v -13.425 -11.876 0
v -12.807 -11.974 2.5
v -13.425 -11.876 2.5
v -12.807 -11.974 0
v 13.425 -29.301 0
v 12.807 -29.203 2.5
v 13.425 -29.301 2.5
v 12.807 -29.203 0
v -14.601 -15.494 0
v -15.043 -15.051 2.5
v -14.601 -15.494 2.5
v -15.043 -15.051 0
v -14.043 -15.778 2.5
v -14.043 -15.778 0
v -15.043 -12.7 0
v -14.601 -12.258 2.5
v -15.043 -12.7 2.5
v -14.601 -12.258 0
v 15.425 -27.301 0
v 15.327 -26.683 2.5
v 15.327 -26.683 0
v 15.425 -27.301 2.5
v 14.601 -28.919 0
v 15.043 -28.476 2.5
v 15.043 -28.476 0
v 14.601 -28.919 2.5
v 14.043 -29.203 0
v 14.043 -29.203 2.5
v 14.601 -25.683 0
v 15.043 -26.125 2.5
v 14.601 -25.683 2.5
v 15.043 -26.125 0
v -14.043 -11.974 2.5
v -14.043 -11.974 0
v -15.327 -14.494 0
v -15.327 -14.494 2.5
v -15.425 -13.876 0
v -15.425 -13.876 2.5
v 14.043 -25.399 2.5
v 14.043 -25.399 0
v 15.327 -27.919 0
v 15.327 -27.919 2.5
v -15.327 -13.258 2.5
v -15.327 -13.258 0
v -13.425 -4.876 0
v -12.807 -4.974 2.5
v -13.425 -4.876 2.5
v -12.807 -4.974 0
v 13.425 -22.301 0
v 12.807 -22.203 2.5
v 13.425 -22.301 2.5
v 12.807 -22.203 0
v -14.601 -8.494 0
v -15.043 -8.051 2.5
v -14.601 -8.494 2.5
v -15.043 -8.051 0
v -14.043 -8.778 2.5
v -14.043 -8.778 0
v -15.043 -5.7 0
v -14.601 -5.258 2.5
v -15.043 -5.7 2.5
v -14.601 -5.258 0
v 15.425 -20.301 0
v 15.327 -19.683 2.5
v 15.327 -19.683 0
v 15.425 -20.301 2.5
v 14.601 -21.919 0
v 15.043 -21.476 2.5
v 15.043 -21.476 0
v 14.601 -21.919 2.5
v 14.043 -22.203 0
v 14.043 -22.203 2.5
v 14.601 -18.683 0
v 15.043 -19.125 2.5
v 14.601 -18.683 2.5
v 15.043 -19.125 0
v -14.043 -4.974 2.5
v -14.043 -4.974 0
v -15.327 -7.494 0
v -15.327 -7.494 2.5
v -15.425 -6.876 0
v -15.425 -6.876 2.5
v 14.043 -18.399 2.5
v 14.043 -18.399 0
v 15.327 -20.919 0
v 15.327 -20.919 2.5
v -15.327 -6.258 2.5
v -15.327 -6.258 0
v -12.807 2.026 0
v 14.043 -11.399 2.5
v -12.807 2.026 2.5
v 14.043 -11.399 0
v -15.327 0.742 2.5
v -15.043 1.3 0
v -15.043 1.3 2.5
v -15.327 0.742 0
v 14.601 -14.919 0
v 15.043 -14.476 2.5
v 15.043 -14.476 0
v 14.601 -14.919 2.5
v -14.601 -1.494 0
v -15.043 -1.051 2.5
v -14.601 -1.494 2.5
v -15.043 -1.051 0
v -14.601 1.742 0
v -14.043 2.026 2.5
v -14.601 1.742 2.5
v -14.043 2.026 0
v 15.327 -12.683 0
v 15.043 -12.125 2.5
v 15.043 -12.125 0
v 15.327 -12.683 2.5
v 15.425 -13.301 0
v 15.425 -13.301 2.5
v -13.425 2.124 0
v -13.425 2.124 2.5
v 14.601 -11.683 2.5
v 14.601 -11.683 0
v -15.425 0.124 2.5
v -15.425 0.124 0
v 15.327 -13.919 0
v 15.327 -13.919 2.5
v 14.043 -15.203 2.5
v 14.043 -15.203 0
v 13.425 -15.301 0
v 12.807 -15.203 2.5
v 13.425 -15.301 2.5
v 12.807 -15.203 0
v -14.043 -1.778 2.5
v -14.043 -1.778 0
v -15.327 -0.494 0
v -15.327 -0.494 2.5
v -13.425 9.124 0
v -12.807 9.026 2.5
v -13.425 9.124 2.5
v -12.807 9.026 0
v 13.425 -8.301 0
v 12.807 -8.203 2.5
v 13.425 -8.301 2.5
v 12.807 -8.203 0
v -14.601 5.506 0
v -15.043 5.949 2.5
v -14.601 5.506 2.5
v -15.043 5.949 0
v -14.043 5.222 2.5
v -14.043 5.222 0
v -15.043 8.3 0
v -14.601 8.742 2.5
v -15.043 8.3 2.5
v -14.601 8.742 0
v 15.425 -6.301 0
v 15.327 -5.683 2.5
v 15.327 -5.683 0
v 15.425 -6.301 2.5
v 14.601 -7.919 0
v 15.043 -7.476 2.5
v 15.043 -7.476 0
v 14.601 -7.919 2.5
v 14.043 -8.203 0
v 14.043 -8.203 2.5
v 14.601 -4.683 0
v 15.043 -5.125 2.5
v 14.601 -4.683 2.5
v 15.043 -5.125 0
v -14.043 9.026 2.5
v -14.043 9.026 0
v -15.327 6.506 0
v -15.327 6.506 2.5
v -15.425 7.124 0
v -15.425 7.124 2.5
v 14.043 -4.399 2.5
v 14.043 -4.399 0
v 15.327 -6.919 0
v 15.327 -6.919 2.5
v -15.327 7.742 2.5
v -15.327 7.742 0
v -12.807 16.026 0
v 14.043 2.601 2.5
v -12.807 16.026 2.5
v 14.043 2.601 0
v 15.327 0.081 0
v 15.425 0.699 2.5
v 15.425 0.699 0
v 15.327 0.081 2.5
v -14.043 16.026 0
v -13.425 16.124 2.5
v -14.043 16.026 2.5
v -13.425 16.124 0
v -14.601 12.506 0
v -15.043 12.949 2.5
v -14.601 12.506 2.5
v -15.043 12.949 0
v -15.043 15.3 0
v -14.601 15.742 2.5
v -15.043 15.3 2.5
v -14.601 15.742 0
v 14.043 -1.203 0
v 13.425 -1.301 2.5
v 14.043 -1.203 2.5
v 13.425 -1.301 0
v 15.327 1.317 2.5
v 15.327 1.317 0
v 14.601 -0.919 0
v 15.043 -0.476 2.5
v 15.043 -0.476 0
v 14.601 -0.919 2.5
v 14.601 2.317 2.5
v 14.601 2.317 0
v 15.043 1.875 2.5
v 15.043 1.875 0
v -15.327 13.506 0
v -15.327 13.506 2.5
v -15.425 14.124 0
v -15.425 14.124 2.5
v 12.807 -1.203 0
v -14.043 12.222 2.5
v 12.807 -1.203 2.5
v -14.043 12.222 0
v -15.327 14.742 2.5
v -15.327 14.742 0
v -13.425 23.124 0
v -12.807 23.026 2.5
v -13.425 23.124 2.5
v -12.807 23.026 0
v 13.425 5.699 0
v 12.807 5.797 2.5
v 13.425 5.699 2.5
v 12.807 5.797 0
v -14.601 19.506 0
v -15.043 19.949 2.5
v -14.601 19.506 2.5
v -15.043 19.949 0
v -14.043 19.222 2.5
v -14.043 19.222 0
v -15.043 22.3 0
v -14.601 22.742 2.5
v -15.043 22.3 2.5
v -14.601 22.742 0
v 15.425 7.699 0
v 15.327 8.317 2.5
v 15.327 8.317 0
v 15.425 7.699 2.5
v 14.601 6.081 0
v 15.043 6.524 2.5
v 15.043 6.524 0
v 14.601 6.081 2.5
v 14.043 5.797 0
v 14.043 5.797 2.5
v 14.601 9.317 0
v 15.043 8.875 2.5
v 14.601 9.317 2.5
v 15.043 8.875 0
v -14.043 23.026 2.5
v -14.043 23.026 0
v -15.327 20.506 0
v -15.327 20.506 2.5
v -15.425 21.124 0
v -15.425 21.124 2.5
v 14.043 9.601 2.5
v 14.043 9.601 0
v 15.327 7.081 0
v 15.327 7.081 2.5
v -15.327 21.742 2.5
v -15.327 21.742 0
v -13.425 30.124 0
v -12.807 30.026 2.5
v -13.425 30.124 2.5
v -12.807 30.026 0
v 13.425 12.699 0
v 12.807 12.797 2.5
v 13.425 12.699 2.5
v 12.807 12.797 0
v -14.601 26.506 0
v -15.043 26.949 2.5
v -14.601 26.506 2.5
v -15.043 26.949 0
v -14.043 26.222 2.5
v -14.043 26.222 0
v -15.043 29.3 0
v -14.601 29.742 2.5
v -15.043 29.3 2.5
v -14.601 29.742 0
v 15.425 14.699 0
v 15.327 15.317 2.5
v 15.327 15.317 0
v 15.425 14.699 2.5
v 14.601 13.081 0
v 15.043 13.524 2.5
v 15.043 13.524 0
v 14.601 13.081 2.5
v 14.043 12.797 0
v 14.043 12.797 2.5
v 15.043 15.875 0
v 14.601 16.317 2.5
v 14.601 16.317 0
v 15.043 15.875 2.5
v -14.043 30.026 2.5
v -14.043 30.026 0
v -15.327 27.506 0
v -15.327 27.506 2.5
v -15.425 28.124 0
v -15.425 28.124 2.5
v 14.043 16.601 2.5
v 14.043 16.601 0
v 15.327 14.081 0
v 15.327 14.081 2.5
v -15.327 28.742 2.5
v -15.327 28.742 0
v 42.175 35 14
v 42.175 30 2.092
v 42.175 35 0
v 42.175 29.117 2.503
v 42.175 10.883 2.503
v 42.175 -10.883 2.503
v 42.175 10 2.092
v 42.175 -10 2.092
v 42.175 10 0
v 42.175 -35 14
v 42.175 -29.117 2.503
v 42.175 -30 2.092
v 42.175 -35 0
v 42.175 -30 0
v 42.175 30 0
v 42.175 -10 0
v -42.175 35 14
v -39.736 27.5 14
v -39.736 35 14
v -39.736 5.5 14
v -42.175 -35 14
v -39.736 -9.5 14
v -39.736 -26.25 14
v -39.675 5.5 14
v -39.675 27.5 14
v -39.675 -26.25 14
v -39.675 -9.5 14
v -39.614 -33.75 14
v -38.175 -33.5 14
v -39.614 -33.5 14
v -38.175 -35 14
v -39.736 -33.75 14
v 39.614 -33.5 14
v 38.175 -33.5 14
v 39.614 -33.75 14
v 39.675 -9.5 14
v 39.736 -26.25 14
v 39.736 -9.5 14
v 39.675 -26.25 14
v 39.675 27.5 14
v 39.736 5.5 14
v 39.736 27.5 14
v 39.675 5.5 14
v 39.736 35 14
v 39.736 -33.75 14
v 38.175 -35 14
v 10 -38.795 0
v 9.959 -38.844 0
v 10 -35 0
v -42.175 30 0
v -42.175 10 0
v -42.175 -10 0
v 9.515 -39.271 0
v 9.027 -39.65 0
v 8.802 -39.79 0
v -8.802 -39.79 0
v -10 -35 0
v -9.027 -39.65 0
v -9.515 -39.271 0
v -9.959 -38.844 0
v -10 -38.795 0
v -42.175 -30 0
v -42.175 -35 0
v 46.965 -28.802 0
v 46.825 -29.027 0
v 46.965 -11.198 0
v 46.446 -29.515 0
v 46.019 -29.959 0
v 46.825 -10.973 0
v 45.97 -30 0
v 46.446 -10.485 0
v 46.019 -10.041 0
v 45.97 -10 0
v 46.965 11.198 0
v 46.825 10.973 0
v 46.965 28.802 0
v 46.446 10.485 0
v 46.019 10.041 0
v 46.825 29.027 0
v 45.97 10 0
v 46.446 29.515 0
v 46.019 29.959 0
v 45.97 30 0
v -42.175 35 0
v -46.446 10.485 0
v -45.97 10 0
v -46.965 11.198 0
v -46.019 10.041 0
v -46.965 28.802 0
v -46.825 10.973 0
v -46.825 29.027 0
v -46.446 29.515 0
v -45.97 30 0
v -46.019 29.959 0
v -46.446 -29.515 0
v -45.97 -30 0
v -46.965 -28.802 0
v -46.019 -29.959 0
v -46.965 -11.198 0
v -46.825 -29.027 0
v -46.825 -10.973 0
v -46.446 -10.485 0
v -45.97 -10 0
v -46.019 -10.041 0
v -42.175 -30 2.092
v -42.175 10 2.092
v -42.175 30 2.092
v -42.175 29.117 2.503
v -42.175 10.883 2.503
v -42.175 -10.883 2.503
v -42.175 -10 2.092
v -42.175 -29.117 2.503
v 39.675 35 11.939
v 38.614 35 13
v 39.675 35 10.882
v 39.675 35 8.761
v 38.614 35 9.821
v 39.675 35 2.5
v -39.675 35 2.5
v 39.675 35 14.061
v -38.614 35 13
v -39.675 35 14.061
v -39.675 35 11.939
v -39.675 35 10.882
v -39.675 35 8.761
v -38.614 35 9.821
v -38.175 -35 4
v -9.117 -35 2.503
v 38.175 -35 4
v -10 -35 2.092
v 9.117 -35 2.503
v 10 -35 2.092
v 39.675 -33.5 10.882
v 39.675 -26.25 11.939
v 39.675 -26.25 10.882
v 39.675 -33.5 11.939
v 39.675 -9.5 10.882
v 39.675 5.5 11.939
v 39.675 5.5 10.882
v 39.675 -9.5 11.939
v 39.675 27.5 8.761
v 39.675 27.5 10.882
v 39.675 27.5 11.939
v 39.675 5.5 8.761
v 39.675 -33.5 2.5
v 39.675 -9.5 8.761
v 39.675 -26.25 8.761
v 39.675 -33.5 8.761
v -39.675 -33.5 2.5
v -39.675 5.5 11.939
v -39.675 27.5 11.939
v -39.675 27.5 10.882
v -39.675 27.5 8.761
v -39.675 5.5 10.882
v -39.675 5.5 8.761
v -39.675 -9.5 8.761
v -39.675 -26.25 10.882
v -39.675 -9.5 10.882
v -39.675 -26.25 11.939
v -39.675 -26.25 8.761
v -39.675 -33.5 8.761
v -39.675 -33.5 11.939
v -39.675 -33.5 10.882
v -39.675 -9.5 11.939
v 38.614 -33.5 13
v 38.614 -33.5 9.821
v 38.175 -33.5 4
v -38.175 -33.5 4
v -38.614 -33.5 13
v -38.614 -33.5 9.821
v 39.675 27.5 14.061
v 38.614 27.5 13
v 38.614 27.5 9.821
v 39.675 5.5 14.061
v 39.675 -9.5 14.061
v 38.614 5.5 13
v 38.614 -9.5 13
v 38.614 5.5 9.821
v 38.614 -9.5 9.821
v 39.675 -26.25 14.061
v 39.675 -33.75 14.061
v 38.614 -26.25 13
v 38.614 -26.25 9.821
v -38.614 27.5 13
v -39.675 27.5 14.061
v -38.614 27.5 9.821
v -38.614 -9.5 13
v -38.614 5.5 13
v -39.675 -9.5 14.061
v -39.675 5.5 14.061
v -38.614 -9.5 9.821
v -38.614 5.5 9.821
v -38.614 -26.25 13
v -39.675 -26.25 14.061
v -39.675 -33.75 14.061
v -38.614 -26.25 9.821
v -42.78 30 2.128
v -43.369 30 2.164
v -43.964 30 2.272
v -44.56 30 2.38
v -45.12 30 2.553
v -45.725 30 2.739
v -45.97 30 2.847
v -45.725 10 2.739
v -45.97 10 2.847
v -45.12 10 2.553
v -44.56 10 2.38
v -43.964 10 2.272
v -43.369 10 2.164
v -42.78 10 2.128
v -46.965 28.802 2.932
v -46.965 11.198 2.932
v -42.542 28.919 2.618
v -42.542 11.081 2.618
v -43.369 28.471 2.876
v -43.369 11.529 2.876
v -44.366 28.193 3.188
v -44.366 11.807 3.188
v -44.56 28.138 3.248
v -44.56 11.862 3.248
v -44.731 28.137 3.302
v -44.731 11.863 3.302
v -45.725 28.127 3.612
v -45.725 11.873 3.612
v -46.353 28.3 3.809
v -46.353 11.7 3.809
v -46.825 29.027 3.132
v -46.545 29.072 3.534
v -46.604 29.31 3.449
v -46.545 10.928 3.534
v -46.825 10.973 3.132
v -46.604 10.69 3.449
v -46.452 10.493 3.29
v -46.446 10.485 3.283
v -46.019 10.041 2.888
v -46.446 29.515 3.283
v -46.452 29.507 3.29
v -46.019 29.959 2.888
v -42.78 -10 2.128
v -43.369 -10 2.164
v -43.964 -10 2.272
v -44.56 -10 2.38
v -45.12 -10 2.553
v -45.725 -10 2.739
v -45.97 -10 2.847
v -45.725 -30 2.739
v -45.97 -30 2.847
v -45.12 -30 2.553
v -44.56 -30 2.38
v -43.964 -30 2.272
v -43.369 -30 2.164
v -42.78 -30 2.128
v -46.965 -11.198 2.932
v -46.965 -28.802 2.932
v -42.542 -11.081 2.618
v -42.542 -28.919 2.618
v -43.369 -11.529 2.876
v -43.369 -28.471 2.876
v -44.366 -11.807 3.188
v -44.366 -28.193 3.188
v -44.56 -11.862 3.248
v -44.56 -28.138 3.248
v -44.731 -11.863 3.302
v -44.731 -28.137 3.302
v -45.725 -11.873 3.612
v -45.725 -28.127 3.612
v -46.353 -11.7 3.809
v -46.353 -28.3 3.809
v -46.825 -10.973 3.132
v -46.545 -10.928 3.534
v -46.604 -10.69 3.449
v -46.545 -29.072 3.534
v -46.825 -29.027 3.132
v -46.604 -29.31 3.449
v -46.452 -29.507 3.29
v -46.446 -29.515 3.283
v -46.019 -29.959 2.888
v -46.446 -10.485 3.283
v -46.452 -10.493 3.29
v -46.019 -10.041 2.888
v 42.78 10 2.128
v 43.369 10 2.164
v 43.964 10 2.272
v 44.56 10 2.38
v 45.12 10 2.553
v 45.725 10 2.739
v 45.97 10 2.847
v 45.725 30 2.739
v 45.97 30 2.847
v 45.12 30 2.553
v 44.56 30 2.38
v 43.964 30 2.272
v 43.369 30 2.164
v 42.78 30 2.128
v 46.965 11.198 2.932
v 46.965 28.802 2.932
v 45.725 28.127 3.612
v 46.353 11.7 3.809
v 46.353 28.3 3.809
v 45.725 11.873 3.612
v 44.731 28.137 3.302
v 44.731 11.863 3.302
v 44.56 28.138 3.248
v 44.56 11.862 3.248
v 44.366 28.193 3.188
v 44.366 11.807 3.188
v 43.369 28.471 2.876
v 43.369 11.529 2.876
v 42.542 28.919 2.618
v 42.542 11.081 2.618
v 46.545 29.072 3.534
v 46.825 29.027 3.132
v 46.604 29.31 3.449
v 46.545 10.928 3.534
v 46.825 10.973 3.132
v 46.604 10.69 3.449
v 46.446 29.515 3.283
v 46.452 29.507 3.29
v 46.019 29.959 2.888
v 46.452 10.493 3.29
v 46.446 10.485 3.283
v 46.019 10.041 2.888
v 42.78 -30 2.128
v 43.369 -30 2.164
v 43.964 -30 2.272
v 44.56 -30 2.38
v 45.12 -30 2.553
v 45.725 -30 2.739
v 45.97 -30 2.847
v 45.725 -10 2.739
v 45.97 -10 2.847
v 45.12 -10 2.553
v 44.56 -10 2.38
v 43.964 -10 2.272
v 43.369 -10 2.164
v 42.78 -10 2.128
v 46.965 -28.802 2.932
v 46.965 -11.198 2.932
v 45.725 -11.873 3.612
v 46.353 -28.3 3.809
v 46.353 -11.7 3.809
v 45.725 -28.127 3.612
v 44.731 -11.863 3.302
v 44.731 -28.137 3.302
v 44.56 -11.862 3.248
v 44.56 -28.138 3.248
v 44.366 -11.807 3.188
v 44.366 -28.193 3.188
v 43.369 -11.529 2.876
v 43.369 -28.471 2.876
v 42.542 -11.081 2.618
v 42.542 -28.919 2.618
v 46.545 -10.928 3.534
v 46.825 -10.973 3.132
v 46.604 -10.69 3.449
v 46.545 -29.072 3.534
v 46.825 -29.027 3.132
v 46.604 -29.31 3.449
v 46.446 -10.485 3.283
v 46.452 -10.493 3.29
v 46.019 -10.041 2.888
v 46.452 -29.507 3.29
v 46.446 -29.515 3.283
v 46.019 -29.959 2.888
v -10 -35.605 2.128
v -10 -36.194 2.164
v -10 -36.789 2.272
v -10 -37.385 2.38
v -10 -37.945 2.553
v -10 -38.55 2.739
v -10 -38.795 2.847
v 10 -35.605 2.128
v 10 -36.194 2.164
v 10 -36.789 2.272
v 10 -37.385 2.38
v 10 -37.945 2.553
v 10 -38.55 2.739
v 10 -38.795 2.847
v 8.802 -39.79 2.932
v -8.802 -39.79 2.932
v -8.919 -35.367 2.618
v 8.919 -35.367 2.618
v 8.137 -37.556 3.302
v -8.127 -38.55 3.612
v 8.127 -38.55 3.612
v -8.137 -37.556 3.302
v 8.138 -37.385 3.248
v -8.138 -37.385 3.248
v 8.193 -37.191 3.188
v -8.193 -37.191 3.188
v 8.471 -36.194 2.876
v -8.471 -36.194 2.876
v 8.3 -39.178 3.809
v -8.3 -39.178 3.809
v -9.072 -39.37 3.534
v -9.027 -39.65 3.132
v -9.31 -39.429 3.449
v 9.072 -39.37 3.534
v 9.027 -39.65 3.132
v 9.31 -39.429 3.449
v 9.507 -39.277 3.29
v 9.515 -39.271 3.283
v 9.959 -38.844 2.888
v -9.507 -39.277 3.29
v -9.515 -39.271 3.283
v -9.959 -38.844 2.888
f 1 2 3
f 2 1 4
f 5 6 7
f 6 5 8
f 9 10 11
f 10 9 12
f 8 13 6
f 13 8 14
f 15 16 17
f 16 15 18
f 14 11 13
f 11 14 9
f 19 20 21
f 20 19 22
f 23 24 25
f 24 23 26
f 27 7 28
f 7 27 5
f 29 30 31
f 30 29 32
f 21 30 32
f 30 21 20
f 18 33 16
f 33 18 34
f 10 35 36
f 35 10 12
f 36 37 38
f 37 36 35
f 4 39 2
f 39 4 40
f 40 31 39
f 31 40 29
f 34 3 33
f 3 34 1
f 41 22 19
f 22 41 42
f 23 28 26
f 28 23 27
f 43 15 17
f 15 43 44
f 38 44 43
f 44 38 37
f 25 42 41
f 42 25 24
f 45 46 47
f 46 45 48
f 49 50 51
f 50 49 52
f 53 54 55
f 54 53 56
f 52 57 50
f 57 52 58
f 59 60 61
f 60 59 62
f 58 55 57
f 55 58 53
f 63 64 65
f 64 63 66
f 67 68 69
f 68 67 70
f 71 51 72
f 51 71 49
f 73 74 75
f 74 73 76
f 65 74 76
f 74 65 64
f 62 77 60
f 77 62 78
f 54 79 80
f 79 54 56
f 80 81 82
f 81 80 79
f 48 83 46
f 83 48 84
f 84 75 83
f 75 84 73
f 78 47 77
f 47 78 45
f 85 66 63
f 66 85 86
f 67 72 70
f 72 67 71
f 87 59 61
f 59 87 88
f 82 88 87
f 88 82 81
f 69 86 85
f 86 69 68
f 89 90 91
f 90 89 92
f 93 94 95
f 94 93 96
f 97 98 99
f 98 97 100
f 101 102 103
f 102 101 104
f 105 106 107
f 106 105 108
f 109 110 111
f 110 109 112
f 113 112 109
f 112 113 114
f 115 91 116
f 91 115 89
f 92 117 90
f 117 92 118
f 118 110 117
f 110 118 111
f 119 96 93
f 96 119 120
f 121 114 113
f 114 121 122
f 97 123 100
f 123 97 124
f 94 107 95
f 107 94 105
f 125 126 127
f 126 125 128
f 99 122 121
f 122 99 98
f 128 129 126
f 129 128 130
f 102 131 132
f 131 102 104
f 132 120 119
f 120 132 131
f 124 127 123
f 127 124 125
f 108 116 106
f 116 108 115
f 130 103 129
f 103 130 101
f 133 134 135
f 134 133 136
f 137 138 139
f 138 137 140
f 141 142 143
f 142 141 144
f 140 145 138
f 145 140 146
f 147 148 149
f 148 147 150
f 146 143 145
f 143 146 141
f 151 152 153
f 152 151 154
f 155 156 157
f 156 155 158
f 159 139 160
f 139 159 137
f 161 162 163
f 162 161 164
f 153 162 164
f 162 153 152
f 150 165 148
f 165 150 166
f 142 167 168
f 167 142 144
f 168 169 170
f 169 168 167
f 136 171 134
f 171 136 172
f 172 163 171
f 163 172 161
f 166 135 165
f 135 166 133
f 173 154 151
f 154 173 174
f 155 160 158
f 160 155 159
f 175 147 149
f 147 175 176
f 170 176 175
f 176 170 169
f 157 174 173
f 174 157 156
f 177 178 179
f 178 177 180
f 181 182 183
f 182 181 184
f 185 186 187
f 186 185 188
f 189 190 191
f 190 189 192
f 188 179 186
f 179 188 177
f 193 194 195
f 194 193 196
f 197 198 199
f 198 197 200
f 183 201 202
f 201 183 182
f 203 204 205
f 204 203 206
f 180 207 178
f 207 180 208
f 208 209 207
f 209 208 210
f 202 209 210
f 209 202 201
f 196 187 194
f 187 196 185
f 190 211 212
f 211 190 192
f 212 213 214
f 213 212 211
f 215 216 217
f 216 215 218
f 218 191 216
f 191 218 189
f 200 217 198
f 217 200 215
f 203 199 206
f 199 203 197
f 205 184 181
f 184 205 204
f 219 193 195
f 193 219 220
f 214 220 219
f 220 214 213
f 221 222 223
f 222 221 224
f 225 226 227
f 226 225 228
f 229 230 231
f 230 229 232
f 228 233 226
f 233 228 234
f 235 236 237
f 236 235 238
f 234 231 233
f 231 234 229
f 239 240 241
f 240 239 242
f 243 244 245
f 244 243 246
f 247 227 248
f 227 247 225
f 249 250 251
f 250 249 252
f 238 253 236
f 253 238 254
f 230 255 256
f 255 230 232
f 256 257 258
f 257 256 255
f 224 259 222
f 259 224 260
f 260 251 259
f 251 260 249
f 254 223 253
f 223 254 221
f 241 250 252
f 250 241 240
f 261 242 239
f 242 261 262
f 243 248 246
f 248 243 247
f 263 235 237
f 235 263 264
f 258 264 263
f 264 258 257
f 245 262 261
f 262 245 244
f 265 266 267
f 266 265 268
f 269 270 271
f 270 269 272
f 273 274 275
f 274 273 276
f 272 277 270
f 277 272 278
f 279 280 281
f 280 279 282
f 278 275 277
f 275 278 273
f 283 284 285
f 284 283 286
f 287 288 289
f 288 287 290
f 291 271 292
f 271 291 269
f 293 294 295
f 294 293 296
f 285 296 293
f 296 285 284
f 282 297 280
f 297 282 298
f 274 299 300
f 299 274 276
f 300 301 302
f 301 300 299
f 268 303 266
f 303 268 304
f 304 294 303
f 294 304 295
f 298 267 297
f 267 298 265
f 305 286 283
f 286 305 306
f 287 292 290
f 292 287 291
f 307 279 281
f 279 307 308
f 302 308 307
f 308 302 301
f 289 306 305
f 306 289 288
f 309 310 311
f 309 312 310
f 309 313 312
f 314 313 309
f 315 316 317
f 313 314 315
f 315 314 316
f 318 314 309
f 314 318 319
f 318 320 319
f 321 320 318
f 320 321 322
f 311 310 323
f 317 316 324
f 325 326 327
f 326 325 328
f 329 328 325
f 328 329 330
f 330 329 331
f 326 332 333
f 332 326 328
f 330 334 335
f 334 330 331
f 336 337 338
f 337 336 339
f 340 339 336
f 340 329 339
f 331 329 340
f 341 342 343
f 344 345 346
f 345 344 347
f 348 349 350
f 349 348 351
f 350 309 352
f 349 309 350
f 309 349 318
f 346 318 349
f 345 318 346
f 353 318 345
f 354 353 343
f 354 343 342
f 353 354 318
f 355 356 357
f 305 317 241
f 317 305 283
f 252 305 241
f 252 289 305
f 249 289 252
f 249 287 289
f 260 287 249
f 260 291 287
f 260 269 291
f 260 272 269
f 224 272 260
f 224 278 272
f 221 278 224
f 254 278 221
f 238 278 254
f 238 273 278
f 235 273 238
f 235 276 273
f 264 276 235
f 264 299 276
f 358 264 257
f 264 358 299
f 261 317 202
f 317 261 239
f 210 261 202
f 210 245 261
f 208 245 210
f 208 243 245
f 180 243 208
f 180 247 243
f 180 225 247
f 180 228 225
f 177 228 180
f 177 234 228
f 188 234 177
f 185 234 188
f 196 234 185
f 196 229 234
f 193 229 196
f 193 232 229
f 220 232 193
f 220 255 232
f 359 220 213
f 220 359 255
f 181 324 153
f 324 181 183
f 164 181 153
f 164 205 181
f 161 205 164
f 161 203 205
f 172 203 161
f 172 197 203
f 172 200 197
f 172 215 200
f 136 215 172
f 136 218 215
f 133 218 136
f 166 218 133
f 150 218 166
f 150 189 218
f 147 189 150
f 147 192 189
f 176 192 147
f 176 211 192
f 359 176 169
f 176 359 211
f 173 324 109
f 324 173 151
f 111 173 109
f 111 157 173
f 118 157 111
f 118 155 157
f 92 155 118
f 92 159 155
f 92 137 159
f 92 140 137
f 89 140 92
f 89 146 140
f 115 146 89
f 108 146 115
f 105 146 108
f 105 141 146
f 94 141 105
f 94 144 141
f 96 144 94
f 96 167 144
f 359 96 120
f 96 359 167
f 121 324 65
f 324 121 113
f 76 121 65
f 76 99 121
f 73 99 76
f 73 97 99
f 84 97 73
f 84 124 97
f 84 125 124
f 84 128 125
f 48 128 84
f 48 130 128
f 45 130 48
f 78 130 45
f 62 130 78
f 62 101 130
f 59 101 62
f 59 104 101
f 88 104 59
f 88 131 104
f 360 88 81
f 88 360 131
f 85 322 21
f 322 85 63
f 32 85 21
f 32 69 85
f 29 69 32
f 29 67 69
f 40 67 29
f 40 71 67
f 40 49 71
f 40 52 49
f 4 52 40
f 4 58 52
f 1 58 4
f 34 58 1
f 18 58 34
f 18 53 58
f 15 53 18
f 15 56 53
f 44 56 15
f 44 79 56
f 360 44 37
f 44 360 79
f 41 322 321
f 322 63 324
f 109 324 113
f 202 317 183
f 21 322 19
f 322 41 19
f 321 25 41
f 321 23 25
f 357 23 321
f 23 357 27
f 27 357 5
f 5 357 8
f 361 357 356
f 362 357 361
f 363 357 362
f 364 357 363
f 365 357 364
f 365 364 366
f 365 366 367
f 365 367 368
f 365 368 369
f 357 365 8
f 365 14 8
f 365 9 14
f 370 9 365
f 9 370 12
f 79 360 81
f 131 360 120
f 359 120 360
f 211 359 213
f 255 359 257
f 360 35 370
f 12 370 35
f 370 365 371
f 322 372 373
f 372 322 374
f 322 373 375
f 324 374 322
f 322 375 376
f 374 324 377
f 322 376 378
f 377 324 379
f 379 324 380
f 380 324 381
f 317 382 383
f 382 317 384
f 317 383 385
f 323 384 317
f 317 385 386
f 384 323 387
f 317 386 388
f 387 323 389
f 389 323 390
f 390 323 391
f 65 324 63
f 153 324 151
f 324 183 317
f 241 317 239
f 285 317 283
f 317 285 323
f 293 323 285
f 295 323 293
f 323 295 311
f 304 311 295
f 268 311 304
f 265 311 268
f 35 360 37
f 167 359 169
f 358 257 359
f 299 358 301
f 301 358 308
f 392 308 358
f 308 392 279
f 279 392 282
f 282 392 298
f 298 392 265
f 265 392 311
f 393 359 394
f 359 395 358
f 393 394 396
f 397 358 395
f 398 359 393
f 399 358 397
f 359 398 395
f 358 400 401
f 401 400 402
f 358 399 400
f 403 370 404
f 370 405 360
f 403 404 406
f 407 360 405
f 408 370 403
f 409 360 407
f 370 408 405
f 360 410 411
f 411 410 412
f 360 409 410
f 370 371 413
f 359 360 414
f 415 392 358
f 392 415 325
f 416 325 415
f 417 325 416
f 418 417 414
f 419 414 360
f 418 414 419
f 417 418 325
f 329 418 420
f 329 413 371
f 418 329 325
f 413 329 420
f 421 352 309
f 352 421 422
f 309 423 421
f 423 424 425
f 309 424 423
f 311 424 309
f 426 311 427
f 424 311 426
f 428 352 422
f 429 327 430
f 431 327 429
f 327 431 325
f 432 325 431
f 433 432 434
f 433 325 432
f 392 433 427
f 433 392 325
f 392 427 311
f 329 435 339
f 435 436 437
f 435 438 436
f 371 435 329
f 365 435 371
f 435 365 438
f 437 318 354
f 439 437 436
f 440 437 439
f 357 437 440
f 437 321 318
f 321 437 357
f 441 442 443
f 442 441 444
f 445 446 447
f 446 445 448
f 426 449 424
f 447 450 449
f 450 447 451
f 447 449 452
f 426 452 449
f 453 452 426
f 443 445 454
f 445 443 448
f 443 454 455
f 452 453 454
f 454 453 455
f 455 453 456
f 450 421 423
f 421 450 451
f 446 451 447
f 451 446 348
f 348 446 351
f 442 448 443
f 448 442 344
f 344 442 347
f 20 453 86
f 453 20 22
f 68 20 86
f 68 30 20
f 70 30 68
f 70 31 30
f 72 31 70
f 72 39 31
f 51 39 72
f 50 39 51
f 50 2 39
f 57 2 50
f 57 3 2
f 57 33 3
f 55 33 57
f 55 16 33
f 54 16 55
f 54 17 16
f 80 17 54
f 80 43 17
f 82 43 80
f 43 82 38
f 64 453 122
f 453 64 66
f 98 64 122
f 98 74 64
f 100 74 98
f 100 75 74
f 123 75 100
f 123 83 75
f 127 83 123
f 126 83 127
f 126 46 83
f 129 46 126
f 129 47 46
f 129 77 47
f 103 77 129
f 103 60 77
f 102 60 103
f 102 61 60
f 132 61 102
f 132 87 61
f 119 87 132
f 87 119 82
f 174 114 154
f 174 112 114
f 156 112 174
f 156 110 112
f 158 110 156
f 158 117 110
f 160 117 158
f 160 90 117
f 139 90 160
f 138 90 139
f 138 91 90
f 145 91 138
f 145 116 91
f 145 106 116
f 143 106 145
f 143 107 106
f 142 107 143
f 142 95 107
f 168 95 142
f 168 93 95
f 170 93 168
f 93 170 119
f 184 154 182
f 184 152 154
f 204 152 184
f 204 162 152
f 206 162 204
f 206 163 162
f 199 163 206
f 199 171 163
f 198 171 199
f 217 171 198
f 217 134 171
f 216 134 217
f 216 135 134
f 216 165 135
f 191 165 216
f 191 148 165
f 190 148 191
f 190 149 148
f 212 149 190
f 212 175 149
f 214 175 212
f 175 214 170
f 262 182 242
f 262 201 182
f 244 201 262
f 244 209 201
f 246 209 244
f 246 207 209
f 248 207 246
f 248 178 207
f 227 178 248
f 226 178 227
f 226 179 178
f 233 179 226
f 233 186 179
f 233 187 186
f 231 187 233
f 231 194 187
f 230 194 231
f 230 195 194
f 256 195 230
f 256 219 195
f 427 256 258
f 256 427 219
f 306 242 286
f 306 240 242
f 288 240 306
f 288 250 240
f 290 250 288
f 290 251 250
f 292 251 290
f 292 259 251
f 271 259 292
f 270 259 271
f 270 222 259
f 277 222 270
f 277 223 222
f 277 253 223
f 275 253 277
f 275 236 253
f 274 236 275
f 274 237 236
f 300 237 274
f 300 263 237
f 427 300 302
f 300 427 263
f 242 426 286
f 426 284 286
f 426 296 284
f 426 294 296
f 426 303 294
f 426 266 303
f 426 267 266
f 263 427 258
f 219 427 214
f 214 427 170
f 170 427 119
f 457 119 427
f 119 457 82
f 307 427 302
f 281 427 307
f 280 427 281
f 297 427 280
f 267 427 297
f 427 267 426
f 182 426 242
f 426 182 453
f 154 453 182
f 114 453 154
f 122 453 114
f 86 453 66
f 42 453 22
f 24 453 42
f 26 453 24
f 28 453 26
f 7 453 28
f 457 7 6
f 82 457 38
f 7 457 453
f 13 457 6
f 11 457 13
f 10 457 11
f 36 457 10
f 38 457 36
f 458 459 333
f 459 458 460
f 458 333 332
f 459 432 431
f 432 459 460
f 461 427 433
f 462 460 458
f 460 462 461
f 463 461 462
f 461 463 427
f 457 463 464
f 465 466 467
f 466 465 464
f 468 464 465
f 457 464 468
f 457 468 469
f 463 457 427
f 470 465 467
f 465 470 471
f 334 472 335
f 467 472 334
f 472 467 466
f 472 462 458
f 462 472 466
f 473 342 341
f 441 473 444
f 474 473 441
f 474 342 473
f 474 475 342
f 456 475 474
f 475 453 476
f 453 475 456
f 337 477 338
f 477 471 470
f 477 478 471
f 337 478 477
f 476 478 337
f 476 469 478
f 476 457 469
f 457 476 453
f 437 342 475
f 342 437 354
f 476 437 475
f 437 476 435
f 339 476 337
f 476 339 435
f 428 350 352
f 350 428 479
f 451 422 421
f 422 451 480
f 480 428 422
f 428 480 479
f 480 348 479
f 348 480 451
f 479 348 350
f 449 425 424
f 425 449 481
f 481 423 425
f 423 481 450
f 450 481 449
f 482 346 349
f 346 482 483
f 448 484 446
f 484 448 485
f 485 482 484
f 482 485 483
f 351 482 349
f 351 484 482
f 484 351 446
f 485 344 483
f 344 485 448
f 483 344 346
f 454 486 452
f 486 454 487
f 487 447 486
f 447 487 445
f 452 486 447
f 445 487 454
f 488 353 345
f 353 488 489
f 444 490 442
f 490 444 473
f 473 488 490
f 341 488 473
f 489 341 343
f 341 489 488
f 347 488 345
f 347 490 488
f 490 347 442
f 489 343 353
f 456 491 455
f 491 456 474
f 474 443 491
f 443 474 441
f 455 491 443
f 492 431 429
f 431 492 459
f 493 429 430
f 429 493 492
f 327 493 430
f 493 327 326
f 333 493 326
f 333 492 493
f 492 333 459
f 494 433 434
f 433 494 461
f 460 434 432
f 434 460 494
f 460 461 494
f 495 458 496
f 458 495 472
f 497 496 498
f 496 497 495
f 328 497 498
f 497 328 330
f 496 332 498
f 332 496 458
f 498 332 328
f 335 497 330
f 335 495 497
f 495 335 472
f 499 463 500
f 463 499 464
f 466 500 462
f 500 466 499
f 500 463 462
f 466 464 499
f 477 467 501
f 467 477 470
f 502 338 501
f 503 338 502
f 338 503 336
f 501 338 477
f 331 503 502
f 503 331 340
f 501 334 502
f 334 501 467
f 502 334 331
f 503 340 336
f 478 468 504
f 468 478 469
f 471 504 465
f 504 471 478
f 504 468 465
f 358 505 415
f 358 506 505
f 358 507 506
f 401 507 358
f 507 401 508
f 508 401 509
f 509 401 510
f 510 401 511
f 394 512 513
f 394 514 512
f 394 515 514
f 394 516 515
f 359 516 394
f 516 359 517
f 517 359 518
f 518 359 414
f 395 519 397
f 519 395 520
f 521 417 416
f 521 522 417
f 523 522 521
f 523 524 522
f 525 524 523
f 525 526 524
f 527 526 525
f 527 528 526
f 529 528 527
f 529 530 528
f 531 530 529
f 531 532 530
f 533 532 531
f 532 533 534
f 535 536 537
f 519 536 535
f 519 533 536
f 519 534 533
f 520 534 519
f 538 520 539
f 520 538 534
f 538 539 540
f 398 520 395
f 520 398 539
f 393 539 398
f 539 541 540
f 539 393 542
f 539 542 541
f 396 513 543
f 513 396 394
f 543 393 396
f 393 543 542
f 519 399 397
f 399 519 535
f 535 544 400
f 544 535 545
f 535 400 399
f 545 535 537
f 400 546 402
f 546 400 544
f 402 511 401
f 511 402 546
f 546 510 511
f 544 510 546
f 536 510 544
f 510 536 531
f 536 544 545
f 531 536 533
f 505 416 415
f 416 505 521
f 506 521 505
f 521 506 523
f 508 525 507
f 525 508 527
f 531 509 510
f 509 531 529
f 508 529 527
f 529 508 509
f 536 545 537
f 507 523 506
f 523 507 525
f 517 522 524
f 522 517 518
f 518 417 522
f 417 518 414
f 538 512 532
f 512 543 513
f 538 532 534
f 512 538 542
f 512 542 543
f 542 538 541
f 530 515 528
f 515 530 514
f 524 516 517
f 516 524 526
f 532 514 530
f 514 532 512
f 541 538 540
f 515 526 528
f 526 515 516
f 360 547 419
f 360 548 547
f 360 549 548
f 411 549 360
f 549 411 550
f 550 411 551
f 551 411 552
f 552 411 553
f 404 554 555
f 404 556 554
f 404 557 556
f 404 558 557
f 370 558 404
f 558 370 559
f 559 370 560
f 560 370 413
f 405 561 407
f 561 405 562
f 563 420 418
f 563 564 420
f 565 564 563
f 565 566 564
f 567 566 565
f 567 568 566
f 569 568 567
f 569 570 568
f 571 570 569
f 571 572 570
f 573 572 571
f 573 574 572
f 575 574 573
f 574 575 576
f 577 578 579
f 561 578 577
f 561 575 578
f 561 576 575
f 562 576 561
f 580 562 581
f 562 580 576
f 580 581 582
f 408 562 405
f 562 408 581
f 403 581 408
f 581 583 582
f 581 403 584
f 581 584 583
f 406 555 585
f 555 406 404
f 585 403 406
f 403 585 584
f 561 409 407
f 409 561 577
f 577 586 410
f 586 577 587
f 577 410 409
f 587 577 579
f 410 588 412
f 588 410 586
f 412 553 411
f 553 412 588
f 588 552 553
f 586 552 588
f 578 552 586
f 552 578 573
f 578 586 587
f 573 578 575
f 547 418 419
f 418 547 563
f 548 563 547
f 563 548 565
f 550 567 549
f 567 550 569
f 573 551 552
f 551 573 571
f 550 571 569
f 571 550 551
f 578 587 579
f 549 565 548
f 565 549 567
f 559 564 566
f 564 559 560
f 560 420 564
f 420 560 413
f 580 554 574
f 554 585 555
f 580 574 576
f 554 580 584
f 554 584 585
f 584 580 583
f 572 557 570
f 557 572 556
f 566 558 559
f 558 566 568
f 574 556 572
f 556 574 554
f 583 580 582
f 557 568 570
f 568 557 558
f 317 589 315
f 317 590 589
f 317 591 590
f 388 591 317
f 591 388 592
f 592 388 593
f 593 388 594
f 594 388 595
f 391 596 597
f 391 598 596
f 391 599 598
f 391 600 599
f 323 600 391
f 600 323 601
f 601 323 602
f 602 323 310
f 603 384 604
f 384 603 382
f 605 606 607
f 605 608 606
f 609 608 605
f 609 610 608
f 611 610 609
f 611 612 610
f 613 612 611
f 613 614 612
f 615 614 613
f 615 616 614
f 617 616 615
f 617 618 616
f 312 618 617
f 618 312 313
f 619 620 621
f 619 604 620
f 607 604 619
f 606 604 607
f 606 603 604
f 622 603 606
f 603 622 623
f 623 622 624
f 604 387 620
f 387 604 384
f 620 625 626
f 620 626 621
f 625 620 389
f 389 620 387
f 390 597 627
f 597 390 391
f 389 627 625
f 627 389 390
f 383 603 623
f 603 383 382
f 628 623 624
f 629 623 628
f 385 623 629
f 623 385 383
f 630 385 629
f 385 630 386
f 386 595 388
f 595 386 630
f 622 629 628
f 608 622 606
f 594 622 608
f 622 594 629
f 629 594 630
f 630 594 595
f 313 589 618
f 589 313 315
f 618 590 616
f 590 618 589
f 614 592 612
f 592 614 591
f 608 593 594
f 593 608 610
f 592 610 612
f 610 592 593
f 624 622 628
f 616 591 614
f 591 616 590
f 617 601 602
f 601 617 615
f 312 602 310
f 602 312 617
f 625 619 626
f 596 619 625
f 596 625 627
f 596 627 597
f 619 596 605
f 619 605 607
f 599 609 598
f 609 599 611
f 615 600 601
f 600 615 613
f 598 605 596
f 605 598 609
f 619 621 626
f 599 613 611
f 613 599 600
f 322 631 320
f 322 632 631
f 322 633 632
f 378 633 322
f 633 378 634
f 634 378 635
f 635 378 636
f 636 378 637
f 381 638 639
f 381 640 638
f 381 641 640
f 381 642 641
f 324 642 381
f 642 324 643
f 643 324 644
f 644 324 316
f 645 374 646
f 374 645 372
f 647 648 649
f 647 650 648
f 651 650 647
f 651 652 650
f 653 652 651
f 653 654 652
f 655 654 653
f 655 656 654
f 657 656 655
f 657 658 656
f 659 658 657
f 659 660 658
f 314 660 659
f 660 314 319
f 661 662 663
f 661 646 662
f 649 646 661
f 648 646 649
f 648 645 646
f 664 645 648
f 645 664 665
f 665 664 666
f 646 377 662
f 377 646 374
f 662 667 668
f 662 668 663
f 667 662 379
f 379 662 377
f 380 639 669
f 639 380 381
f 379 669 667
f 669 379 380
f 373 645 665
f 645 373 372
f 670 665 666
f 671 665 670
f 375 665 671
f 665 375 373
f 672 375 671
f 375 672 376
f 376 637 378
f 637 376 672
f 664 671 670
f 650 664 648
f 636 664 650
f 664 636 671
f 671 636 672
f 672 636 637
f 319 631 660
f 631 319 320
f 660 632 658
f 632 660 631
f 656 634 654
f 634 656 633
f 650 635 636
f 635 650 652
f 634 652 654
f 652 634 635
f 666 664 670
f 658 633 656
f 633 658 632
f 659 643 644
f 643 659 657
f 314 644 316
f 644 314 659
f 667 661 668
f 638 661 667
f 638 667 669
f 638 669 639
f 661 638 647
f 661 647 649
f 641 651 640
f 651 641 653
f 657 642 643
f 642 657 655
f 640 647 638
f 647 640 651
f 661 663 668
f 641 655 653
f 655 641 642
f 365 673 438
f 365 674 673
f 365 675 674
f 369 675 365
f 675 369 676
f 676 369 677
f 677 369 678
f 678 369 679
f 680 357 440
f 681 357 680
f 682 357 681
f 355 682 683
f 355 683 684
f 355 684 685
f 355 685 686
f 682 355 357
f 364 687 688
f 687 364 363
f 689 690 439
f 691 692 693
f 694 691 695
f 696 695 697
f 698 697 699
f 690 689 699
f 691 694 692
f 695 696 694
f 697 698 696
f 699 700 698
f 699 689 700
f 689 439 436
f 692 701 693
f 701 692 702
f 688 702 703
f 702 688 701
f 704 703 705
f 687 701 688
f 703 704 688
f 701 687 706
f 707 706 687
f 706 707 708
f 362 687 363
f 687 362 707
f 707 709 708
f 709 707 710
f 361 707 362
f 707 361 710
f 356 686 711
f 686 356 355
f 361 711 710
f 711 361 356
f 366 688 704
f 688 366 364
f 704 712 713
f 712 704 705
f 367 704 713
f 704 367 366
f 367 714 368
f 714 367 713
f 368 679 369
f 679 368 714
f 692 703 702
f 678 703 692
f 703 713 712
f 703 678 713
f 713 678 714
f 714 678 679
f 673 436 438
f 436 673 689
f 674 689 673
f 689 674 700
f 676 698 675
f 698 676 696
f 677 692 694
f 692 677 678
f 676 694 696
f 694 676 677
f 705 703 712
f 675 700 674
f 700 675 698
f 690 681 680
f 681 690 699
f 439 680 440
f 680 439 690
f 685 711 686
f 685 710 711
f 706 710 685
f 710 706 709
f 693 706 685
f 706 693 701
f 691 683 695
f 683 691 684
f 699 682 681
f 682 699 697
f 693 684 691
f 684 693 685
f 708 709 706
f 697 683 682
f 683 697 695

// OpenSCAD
// file: long_bow_tie.scad
tilt_level = 1.1;

include <include.scad>;
include <globals.scad>;

obj_leg = 12;

function scale_x() = 1;
function scale_z() = (male_dove_depth-0.2)/male_dove_depth;

length = 50;

module bow_tie_master(length){
	union(){
		mirror([0,1,0])	dovetail_3d(male_dove_max_width, male_dove_min_width, male_dove_depth, length);
		dovetail_3d(male_dove_max_width, male_dove_min_width, male_dove_depth, length);
	}
}

module long_bow_tie_unscaled(length) {

    module endcyl() {
        translate([0,0,-3]) cylinder(d=24, h=6, $fn=60);
    }

    module endtub() {
        rotate([0,90,0]) translate([0,0,-15/2]) difference() {
            cylinder(d=20, h=15, $fn=60);
            cylinder(d=12, h=16, $fn=60);
            translate([-20,0,-0.1]) cube([40,20,16]);
        }
    }

    translate([0,length/2,0]) difference() {
        intersection(){
            rotate([90,0,0]) bow_tie_master(length);
            rotate([90,0,0]) cylinder(r=5.8, h=200);
        }
        translate([13,5,0]) rotate([90,0,25]) endcyl();
        translate([-13,5,0]) rotate([90,0,-25]) endcyl();
        translate([13,-length-5,0]) rotate([90,0,-25]) endcyl();
        translate([-13,-length-5,0]) rotate([90,0,25]) endcyl();

        translate([0,-length+4.5,0]) endtub();
        translate([0,-4.5,0]) rotate([180,0,0]) endtub();
    }
}

module long_bow_tie(length=length, scale_x=scale_x(), scale_z=scale_z(),middle=false) {
    scale([scale_x, 1, scale_z]) {
        if(middle)
            long_bow_tie_unscaled(length);
        else
            translate([0,0,male_dove_depth]) long_bow_tie_unscaled(length);
    }
}

module split(length) {
    translate([0,0,-length/2-1]) linear_extrude(height=length+2) polygon(points=[[0,-1], [1,-1], [2.1,-5], [-2.1,-5], [-1,-1]]);
}

module long_bow_tie_split(length=length, scale_x=scale_x(), scale_z=scale_z(),middle=false) {
    module _do_split() {
        rotate([90,0,0]) difference() {
            rotate([-90,0,0]) long_bow_tie(length,scale_x=scale_x,scale_z=scale_z,middle=true);
            split(length);
            rotate([0,0,180]) split(length);
        }
    }
        
    if (!middle) 
        translate([0,0,scale_z*male_dove_depth]) _do_split();
    else
        _do_split();
}

module long_bow_tie_half(length=length, scale_x=scale_x(), scale_z=scale_z(),middle=true) {
    rotate([0,-90,0]) intersection() {
        long_bow_tie(length,middle=middle);
        translate([0,-length/2,-24/2]) cube([8, length, 24]);
    }
}

module long_bow_tie_half_split(length=length, scale_x=scale_x(), scale_z=scale_z()) {
    union() {
        intersection() {
            long_bow_tie_split(length,scale_x=scale_x,scale_z=scale_z,middle=true);
            translate([0,0,-6/2]) cube([10,length,6],center=true);
        }
        cube([scale_x*male_dove_min_width,length,1.6],center=true);
        translate([((scale_x*male_dove_min_width)/2)/2,0,4/2]) cube([(scale_x*male_dove_min_width)/2,length,4],center=true);
        translate([0,0,4]) intersection() {
            long_bow_tie(length,scale_x=scale_x,scale_z=scale_z,middle=true);
            translate([5/2,0,5/2]) cube([5,length,5],center=true);
        }
    }
}

//long_bow_tie();
//long_bow_tie(25);
//long_bow_tie_half(length);
//long_bow_tie_half(30);
//long_bow_tie_split(length);
long_bow_tie_half_split(length);
// file: long_tie.scad
length = 50;

include <include.scad>;
include <globals.scad>;

use <long_bow_tie.scad>;

$fn=30;

// alter these the get properly fitting parts
scale_x = scale_x();
scale_z = scale_z();
length = 50;

module long_tie(length=length) {
    translate([0,0,scaled_male_dove_depth()]) rotate([0,180,0]) difference(){
        long_bow_tie(length, scale_x=scale_x, scale_z=scale_z);
        translate([-5,-length/2-1,scaled_male_dove_depth()]) cube([10,length+2,male_dove_depth]);
    }
}

module long_tie_split(length=length) {
    union() {
        difference() {
            translate([0,0,-male_dove_depth+slop]) long_bow_tie_split(length);
            translate([0,0, -3.5]) cube([10,length+1,7], center=true);
        }
        translate([0,0, 0.8]) cube([4,length,1.6], center=true);
    }
}

module long_tie_half(length=length) {
    rotate([0,-90,0]) intersection() {
        long_tie(length);
        translate([0,-length/2,0]) cube([5,length,5]);
    }
}

long_tie(length);
//long_tie_half(length);
//long_tie_split(length);
// file: globals.scad
/*
Most things in this file is represented as one millimeter, so keep that in mind while changing things.
Some of the setting are not mm but at variables that you can set, such as 2*x=2x and you are setting what x is.
I will try to specify when things are variables and not exact measurements.
*/

// printer slop
slop = 0.15;

obj_leg = 30;
leg_length = 5.5;
small_number = 0.001;
metal_core_rode_global = 5;


///////////////// number of holes /////////////////////
z_hole_number = 8;
other_holes = 8;

///////////////// Pins /////////////////////

//pins that poke out
ball_size = 10;
pin_height = 20;
pin_diameter = 6;


//holes
hole_ball_size = ball_size;
hole_pin_height = pin_height;
hole_pin_diameter = pin_diameter;

///////////////// Z THINGS /////////////////////

berring_slot_width = 7.5;
berring_slot_depth = 6.5;
metal_core_rode = 5;

///////////////// X THINGS /////////////////////

//male dove tails
male_dove_max_width=8;
male_dove_min_width=5;
male_dove_depth=5;
male_dove_height=obj_leg/2;

function scaled_male_dove_max_width() = male_dove_max_width;
function scaled_male_dove_min_width() = male_dove_min_width - 0.5*slop;
function scaled_male_dove_depth() = male_dove_depth - .2;

//female dove tails, this is found on the y mounts
girl_max_width=11;
girl_min_width=5;
girl_depth=5;
girl_height=obj_leg;


///////////////// Y THINGS /////////////////////
/*
The Y is so normal that all of those global variables at the top should change all of the setting in it, this section is set her incase there are variables set in the future development of this project.
*/

// stepper
motor_side_length = 43.2;
motor_bolt_hole_distance = 31;
motor_center_hole = 23;
motor_shaft_dia = 5;
motor_shaft_hole_dia = 5;

// bolts etc.
bolt_hole_dia = 3+2*slop;
bolt_head_hole_dia = 6.2;

m4_bolt_hole_dia = 4+2*slop;
m4_bolt_head_hole_dia = 6.8+2*slop;

m3_nut_side = 5.65;
m3_nut_height = 2.3;
m4_nut_side = 6.85;
m4_nut_height = 3.1;

// threaded rod
lifter_rod_diam = 9.86;
hole_threaded_rod = lifter_rod_diam+2*slop;

// for the extensions
metal_rod_size = 9;

// z screw
z_screw_d = 25;

// stabilizer
pin_bolt_dia = 12-2*slop;
pin_bolt_dia_minus = 12+2*slop;

clip_bolt_dia = 10-2*slop;
clip_bolt_dia_minus = 10+2*slop;
// main file
include <globals.scad>;
include <include.scad>;
use <long_tie.scad>;
use <long_bow_tie.scad>;
use <mockups.scad>;

box_width = 83;
box_length = 123;

$fn=30;

arduino_width = 53.7;
arduino_length = 101.6;
arduino_thickness = 2;

ramps_mount_w = arduino_width + 5;
ramps_mount_l = arduino_length;

ramps_w = 60.5;
ramps_l = 123;

raspberry_pi_3b_w = 56.1;
raspberry_pi_3b_l = 85;

raspi_mount_w = raspberry_pi_3b_w + 4;
raspi_mount_l = raspberry_pi_3b_l + 1;

module ear() {
    hull() {
        translate([0,0,0]) cube([5,15,0.1]);
        translate([20,7.5,0]) cylinder(d=15,h=0.1);

        translate([0,3.5,3.9]) cube([5,8,0.1]);
        translate([20,7.5,3.9]) cylinder(d=8,h=0.1);
    }
}

module ears() {
    difference() {
        hull() {
            ear();
            mirror([1,0,0]) ear();
        }
        translate([20,7.5,0]) cylinder(d=bolt_hole_dia,h=7);
        translate([20,7.5,1.8]) nut();

        translate([-20,7.5,0]) cylinder(d=bolt_hole_dia,h=7);
        translate([-20,7.5,1.8]) nut();
    }
}

module ramps_mount_adapter() {
    // for thing: https://www.thingiverse.com/thing:861360
    // drill holes to the box and use 3mm screws & nuts
    difference() {
        union() {
            translate([0,3.5,0]) cube([20, box_length-27, 7.5]);
            translate([10, box_length-20-15, 0]) ears();
            translate([10, 0, 0]) ears();
        }
        translate([10, 0, 7.5]) rotate([-90,0,0]) male_dovetail(box_length);
    }
}

module _stripe() {
    x = arduino_width/4;
    y = x/2;
    hull() {
        translate([-x,y,0]) cylinder(d=4, h=5,$fn=20);
        translate([x,-y,0]) cylinder(d=4, h=5,$fn=20);
    }
}

module _notch(w=2,l=10) {
    notch_h = sqrt(w*w*2);
    rotate([0,45,0]) cube([w,l,w], center=true);
    translate([0,0,-arduino_thickness-notch_h/1.8]) rotate([0,45,0]) cube([w,l,w], center=true);
}

module ramps_mount() {

    module bow_ear() {
        difference() {
            cube([22,15,8]);
            translate([15,22,0]) rotate([90,0,0]) male_dovetail(25);
        }
    }

    // bottom thickness + arduino clearance + arduino mount height
    h = 2.5 + 2 + arduino_thickness + 4;
    h2 = h - 2.5;

    union() {
        difference() {
            translate([0,0,h/2]) cube([ramps_mount_w, arduino_length, h], center=true);
            translate([0,2,h2/2+(h-h2)]) cube([arduino_width, arduino_length, h2], center=true);
            translate([0,-1,h2/2+(h-h2)+2]) cube([arduino_width-3, arduino_length, h2], center=true);
            for(i = [0:8]) {
                translate([0,-arduino_length/3+i*8,0]) _stripe();
            }
        }

        translate([arduino_width/2,arduino_length/2-10,h-1.4]) _notch();
        translate([arduino_width/2,-arduino_length/2+10,h-1.4]) _notch();

        translate([-arduino_width/2,arduino_length/2-10,h-1.4]) _notch();
        translate([-arduino_width/2,-arduino_length/2+10,h-1.4]) _notch();

        translate([ramps_mount_w/2-0.01,arduino_length/2-15,0]) rotate([0,0,180]) long_tie_half(20);
        translate([ramps_mount_w/2-0.01,-arduino_length/2+15,0]) rotate([0,0,180]) long_tie_half(20);
        translate([0,-ramps_mount_l/2+0.01,0]) rotate([0,0,90]) long_tie_half(20);

        translate([-ramps_mount_w/2+0.01,arduino_length/2-15,0]) long_tie_half(20);
        translate([-ramps_mount_w/2+0.01,-arduino_length/2+15,0])  long_tie_half(20);
        
        translate([0,ramps_mount_l/2-0.01,0]) rotate([0,0,-90]) long_tie_half(20);
    }
}

module raspberry_pi_3b_mount() {
    // download: https://www.thingiverse.com/thing:1701186
    %translate([-29.5,45,0.6]) rotate([0,0,-90]) import("../../_downloaded/Raspberry_pi_3_reference/Raspberry_Pi_3_Light_Version.STL");
    
    h = 11;

    difference() {
        cube([raspi_mount_w,raspi_mount_l,h], center=true);
        translate([0,0,2.5]) cube([raspberry_pi_3b_w,raspi_mount_l+1,h], center=true);

        for(i = [0:7]) {
            translate([0,i*7-raspi_mount_l/3.4,-h/2]) _stripe();
        }
        translate([-raspi_mount_w/2-1,27,8/2-1.6]) cube([9.8,9,4]);
        translate([-raspi_mount_w/2-1,2.4,8/2-1.6]) cube([10,16,4]);
        translate([-raspi_mount_w/2-1,-11.2,8/2+2]) rotate([0,90,0]) cylinder(d=8,h=5,$fn=20);
    }

    translate([raspberry_pi_3b_w/2, raspi_mount_l/2-3.75,h/2-1]) _notch(w=1.5,l=7.5);
    translate([raspberry_pi_3b_w/2, -raspi_mount_l/2+21,h/2-1]) _notch(w=1.5);
    translate([-raspberry_pi_3b_w/2, raspi_mount_l/2-3.5,h/2-1]) _notch(w=1.5,l=7);
    translate([-raspberry_pi_3b_w/2, -raspi_mount_l/2+22,h/2-1]) _notch(w=1.5,l=10);

    translate([-raspi_mount_w/2+0.01,raspi_mount_l/2-15,-h/2]) long_tie_half(20);
    translate([-raspi_mount_w/2+0.01,-raspi_mount_l/2+15,-h/2]) long_tie_half(20);

    translate([raspi_mount_w/2-0.01,raspi_mount_l/2-15,-h/2]) rotate([0,0,180]) long_tie_half(20);
    translate([raspi_mount_w/2-0.01,-raspi_mount_l/2+15,-h/2]) rotate([0,0,180]) long_tie_half(20);

    translate([0,-raspi_mount_l/2+0.01,-h/2]) rotate([0,0,90,0]) long_tie_half(20);
    translate([0,raspi_mount_l/2-0.01,-h/2]) rotate([0,0,-90,0]) long_tie_half(20);
}

module atx_connector_mount() {
    // for the connector parts, see: https://github.com/spegelius/3DModels/blob/master/PrinterParts/ATX_Connector_Mount.scad

    wall = 2.5;
    inner_w = 79.35;
    outer_w = inner_w+2*wall;
    l = 70;
    h = 14;

    union() {
        difference() {
            translate([0,0,14/2]) cube([outer_w, l, h], center=true);
            translate([0,2,14/2+wall]) cube([inner_w, l+1, h], center=true);
            translate([0,0,14/2+wall+1.5]) cube([inner_w-3, l+1, h], center=true);

            for(i = [0:6]) {
                translate([0,i*7-l/3.4,-0.01]) _stripe();
            }

        }

        translate([inner_w/2, l/2-3.75,h-1]) _notch(w=1.5,l=7.5);
        translate([inner_w/2, -2,h-1]) _notch(w=1.5,l=15);
        translate([inner_w/2, -l/2+5,h-1]) _notch(w=1.5,l=7.5);

        translate([-inner_w/2, l/2-3.75,h-1]) _notch(w=1.5,l=7.5);
        translate([-inner_w/2, -2,h-1]) _notch(w=1.5,l=15);
        translate([-inner_w/2, -l/2+5,h-1]) _notch(w=1.5,l=7.5);

        translate([-outer_w/2+0.01,l/2-15,0]) long_tie_half(20);
        translate([-outer_w/2+0.01,-l/2+15,0]) long_tie_half(20);

        translate([outer_w/2-0.01,l/2-15,0]) rotate([0,0,180]) long_tie_half(20);
        translate([outer_w/2-0.01,-l/2+15,0]) rotate([0,0,180]) long_tie_half(20);

        translate([0,-l/2+0.01,0]) rotate([0,0,90,0]) long_tie_half(20);
    }
}

module fan_mount_60mm() {
    // inspired by: https://www.thingiverse.com/thing:145946
    h = 12;
    l = 50;
    wall = 3.5;
    inner_w = ramps_w-4;
    outer_w = inner_w + 2*wall;

    difference() {
        rounded_cube_side(outer_w,l,h,5, center=true);
        translate([0,wall,1.5]) rounded_cube_side(inner_w,l,h+1, 4, center=true);
        translate([0,wall+10,0]) cube([inner_w,l,h+1], center=true);
        translate([0,l/2-3,0]) cube([ramps_w-1,2.2,20], center=true);

        translate([0,l/2-10,20/2]) chamfered_cube(outer_w+20,l,20,7, center=true);

        translate([0,0,60/2-h/2+4]) rotate([90,0,0]) {
            cylinder(d=60,h=100,$fn=60);
            translate([-25,-25,0]) cylinder(d=2.8,h=100,$fn=20);
            translate([25,-25,0]) cylinder(d=2.8,h=100,$fn=20);
        }

        #mirror([1,0,0]) translate([outer_w/2-5,-l/2+10,-h/2]) rotate([0,0,180]) linear_extrude(0.6) text(align="center",size=8, "RAMPS 1.4");
    }
}

module _male_dove_half(h) {
    intersection() {
        scale([1.08,1.02,1]) male_dovetail(h);
        translate([-5,0,0]) cube([5,5,h]);
    }
}

module frame_clip() {
    union() {
        difference() {
            translate([0,2,0]) rounded_cube_side(8,12,20,3);
            translate([6,2,0]) _male_dove_half(21);
        }
        translate([8-2,0,0]) rounded_cube_side(2,14,20,2);
        translate([8.3,14,20/2]) rotate([-90,0,180]) long_bow_tie_half(20);
    }
}

module joint_clip() {
    union() {
        difference() {
            translate([0,2,0]) rounded_cube_side(8,12,20,3);
            translate([6,2,0]) _male_dove_half(21);
            translate([6,14,0]) mirror([0,1,0]) _male_dove_half(21);
        }
        translate([8-2,0,0]) rounded_cube_side(2,16,20,2);
    }
}

module debug() {
    frame_mockup(units_x=2, units_y=2);
    translate([120.65,-180,80.8]) rotate([90,0,0]) ramps_mount();
}

//debug();

//translate([95,127.5,0]) rotate([90,0,0]) body();
//ramps_mount_adapter();
//ramps_mount();
//raspberry_pi_3b_mount();
atx_connector_mount();
//fan_mount_60mm();
//frame_clip();
//joint_clip();
